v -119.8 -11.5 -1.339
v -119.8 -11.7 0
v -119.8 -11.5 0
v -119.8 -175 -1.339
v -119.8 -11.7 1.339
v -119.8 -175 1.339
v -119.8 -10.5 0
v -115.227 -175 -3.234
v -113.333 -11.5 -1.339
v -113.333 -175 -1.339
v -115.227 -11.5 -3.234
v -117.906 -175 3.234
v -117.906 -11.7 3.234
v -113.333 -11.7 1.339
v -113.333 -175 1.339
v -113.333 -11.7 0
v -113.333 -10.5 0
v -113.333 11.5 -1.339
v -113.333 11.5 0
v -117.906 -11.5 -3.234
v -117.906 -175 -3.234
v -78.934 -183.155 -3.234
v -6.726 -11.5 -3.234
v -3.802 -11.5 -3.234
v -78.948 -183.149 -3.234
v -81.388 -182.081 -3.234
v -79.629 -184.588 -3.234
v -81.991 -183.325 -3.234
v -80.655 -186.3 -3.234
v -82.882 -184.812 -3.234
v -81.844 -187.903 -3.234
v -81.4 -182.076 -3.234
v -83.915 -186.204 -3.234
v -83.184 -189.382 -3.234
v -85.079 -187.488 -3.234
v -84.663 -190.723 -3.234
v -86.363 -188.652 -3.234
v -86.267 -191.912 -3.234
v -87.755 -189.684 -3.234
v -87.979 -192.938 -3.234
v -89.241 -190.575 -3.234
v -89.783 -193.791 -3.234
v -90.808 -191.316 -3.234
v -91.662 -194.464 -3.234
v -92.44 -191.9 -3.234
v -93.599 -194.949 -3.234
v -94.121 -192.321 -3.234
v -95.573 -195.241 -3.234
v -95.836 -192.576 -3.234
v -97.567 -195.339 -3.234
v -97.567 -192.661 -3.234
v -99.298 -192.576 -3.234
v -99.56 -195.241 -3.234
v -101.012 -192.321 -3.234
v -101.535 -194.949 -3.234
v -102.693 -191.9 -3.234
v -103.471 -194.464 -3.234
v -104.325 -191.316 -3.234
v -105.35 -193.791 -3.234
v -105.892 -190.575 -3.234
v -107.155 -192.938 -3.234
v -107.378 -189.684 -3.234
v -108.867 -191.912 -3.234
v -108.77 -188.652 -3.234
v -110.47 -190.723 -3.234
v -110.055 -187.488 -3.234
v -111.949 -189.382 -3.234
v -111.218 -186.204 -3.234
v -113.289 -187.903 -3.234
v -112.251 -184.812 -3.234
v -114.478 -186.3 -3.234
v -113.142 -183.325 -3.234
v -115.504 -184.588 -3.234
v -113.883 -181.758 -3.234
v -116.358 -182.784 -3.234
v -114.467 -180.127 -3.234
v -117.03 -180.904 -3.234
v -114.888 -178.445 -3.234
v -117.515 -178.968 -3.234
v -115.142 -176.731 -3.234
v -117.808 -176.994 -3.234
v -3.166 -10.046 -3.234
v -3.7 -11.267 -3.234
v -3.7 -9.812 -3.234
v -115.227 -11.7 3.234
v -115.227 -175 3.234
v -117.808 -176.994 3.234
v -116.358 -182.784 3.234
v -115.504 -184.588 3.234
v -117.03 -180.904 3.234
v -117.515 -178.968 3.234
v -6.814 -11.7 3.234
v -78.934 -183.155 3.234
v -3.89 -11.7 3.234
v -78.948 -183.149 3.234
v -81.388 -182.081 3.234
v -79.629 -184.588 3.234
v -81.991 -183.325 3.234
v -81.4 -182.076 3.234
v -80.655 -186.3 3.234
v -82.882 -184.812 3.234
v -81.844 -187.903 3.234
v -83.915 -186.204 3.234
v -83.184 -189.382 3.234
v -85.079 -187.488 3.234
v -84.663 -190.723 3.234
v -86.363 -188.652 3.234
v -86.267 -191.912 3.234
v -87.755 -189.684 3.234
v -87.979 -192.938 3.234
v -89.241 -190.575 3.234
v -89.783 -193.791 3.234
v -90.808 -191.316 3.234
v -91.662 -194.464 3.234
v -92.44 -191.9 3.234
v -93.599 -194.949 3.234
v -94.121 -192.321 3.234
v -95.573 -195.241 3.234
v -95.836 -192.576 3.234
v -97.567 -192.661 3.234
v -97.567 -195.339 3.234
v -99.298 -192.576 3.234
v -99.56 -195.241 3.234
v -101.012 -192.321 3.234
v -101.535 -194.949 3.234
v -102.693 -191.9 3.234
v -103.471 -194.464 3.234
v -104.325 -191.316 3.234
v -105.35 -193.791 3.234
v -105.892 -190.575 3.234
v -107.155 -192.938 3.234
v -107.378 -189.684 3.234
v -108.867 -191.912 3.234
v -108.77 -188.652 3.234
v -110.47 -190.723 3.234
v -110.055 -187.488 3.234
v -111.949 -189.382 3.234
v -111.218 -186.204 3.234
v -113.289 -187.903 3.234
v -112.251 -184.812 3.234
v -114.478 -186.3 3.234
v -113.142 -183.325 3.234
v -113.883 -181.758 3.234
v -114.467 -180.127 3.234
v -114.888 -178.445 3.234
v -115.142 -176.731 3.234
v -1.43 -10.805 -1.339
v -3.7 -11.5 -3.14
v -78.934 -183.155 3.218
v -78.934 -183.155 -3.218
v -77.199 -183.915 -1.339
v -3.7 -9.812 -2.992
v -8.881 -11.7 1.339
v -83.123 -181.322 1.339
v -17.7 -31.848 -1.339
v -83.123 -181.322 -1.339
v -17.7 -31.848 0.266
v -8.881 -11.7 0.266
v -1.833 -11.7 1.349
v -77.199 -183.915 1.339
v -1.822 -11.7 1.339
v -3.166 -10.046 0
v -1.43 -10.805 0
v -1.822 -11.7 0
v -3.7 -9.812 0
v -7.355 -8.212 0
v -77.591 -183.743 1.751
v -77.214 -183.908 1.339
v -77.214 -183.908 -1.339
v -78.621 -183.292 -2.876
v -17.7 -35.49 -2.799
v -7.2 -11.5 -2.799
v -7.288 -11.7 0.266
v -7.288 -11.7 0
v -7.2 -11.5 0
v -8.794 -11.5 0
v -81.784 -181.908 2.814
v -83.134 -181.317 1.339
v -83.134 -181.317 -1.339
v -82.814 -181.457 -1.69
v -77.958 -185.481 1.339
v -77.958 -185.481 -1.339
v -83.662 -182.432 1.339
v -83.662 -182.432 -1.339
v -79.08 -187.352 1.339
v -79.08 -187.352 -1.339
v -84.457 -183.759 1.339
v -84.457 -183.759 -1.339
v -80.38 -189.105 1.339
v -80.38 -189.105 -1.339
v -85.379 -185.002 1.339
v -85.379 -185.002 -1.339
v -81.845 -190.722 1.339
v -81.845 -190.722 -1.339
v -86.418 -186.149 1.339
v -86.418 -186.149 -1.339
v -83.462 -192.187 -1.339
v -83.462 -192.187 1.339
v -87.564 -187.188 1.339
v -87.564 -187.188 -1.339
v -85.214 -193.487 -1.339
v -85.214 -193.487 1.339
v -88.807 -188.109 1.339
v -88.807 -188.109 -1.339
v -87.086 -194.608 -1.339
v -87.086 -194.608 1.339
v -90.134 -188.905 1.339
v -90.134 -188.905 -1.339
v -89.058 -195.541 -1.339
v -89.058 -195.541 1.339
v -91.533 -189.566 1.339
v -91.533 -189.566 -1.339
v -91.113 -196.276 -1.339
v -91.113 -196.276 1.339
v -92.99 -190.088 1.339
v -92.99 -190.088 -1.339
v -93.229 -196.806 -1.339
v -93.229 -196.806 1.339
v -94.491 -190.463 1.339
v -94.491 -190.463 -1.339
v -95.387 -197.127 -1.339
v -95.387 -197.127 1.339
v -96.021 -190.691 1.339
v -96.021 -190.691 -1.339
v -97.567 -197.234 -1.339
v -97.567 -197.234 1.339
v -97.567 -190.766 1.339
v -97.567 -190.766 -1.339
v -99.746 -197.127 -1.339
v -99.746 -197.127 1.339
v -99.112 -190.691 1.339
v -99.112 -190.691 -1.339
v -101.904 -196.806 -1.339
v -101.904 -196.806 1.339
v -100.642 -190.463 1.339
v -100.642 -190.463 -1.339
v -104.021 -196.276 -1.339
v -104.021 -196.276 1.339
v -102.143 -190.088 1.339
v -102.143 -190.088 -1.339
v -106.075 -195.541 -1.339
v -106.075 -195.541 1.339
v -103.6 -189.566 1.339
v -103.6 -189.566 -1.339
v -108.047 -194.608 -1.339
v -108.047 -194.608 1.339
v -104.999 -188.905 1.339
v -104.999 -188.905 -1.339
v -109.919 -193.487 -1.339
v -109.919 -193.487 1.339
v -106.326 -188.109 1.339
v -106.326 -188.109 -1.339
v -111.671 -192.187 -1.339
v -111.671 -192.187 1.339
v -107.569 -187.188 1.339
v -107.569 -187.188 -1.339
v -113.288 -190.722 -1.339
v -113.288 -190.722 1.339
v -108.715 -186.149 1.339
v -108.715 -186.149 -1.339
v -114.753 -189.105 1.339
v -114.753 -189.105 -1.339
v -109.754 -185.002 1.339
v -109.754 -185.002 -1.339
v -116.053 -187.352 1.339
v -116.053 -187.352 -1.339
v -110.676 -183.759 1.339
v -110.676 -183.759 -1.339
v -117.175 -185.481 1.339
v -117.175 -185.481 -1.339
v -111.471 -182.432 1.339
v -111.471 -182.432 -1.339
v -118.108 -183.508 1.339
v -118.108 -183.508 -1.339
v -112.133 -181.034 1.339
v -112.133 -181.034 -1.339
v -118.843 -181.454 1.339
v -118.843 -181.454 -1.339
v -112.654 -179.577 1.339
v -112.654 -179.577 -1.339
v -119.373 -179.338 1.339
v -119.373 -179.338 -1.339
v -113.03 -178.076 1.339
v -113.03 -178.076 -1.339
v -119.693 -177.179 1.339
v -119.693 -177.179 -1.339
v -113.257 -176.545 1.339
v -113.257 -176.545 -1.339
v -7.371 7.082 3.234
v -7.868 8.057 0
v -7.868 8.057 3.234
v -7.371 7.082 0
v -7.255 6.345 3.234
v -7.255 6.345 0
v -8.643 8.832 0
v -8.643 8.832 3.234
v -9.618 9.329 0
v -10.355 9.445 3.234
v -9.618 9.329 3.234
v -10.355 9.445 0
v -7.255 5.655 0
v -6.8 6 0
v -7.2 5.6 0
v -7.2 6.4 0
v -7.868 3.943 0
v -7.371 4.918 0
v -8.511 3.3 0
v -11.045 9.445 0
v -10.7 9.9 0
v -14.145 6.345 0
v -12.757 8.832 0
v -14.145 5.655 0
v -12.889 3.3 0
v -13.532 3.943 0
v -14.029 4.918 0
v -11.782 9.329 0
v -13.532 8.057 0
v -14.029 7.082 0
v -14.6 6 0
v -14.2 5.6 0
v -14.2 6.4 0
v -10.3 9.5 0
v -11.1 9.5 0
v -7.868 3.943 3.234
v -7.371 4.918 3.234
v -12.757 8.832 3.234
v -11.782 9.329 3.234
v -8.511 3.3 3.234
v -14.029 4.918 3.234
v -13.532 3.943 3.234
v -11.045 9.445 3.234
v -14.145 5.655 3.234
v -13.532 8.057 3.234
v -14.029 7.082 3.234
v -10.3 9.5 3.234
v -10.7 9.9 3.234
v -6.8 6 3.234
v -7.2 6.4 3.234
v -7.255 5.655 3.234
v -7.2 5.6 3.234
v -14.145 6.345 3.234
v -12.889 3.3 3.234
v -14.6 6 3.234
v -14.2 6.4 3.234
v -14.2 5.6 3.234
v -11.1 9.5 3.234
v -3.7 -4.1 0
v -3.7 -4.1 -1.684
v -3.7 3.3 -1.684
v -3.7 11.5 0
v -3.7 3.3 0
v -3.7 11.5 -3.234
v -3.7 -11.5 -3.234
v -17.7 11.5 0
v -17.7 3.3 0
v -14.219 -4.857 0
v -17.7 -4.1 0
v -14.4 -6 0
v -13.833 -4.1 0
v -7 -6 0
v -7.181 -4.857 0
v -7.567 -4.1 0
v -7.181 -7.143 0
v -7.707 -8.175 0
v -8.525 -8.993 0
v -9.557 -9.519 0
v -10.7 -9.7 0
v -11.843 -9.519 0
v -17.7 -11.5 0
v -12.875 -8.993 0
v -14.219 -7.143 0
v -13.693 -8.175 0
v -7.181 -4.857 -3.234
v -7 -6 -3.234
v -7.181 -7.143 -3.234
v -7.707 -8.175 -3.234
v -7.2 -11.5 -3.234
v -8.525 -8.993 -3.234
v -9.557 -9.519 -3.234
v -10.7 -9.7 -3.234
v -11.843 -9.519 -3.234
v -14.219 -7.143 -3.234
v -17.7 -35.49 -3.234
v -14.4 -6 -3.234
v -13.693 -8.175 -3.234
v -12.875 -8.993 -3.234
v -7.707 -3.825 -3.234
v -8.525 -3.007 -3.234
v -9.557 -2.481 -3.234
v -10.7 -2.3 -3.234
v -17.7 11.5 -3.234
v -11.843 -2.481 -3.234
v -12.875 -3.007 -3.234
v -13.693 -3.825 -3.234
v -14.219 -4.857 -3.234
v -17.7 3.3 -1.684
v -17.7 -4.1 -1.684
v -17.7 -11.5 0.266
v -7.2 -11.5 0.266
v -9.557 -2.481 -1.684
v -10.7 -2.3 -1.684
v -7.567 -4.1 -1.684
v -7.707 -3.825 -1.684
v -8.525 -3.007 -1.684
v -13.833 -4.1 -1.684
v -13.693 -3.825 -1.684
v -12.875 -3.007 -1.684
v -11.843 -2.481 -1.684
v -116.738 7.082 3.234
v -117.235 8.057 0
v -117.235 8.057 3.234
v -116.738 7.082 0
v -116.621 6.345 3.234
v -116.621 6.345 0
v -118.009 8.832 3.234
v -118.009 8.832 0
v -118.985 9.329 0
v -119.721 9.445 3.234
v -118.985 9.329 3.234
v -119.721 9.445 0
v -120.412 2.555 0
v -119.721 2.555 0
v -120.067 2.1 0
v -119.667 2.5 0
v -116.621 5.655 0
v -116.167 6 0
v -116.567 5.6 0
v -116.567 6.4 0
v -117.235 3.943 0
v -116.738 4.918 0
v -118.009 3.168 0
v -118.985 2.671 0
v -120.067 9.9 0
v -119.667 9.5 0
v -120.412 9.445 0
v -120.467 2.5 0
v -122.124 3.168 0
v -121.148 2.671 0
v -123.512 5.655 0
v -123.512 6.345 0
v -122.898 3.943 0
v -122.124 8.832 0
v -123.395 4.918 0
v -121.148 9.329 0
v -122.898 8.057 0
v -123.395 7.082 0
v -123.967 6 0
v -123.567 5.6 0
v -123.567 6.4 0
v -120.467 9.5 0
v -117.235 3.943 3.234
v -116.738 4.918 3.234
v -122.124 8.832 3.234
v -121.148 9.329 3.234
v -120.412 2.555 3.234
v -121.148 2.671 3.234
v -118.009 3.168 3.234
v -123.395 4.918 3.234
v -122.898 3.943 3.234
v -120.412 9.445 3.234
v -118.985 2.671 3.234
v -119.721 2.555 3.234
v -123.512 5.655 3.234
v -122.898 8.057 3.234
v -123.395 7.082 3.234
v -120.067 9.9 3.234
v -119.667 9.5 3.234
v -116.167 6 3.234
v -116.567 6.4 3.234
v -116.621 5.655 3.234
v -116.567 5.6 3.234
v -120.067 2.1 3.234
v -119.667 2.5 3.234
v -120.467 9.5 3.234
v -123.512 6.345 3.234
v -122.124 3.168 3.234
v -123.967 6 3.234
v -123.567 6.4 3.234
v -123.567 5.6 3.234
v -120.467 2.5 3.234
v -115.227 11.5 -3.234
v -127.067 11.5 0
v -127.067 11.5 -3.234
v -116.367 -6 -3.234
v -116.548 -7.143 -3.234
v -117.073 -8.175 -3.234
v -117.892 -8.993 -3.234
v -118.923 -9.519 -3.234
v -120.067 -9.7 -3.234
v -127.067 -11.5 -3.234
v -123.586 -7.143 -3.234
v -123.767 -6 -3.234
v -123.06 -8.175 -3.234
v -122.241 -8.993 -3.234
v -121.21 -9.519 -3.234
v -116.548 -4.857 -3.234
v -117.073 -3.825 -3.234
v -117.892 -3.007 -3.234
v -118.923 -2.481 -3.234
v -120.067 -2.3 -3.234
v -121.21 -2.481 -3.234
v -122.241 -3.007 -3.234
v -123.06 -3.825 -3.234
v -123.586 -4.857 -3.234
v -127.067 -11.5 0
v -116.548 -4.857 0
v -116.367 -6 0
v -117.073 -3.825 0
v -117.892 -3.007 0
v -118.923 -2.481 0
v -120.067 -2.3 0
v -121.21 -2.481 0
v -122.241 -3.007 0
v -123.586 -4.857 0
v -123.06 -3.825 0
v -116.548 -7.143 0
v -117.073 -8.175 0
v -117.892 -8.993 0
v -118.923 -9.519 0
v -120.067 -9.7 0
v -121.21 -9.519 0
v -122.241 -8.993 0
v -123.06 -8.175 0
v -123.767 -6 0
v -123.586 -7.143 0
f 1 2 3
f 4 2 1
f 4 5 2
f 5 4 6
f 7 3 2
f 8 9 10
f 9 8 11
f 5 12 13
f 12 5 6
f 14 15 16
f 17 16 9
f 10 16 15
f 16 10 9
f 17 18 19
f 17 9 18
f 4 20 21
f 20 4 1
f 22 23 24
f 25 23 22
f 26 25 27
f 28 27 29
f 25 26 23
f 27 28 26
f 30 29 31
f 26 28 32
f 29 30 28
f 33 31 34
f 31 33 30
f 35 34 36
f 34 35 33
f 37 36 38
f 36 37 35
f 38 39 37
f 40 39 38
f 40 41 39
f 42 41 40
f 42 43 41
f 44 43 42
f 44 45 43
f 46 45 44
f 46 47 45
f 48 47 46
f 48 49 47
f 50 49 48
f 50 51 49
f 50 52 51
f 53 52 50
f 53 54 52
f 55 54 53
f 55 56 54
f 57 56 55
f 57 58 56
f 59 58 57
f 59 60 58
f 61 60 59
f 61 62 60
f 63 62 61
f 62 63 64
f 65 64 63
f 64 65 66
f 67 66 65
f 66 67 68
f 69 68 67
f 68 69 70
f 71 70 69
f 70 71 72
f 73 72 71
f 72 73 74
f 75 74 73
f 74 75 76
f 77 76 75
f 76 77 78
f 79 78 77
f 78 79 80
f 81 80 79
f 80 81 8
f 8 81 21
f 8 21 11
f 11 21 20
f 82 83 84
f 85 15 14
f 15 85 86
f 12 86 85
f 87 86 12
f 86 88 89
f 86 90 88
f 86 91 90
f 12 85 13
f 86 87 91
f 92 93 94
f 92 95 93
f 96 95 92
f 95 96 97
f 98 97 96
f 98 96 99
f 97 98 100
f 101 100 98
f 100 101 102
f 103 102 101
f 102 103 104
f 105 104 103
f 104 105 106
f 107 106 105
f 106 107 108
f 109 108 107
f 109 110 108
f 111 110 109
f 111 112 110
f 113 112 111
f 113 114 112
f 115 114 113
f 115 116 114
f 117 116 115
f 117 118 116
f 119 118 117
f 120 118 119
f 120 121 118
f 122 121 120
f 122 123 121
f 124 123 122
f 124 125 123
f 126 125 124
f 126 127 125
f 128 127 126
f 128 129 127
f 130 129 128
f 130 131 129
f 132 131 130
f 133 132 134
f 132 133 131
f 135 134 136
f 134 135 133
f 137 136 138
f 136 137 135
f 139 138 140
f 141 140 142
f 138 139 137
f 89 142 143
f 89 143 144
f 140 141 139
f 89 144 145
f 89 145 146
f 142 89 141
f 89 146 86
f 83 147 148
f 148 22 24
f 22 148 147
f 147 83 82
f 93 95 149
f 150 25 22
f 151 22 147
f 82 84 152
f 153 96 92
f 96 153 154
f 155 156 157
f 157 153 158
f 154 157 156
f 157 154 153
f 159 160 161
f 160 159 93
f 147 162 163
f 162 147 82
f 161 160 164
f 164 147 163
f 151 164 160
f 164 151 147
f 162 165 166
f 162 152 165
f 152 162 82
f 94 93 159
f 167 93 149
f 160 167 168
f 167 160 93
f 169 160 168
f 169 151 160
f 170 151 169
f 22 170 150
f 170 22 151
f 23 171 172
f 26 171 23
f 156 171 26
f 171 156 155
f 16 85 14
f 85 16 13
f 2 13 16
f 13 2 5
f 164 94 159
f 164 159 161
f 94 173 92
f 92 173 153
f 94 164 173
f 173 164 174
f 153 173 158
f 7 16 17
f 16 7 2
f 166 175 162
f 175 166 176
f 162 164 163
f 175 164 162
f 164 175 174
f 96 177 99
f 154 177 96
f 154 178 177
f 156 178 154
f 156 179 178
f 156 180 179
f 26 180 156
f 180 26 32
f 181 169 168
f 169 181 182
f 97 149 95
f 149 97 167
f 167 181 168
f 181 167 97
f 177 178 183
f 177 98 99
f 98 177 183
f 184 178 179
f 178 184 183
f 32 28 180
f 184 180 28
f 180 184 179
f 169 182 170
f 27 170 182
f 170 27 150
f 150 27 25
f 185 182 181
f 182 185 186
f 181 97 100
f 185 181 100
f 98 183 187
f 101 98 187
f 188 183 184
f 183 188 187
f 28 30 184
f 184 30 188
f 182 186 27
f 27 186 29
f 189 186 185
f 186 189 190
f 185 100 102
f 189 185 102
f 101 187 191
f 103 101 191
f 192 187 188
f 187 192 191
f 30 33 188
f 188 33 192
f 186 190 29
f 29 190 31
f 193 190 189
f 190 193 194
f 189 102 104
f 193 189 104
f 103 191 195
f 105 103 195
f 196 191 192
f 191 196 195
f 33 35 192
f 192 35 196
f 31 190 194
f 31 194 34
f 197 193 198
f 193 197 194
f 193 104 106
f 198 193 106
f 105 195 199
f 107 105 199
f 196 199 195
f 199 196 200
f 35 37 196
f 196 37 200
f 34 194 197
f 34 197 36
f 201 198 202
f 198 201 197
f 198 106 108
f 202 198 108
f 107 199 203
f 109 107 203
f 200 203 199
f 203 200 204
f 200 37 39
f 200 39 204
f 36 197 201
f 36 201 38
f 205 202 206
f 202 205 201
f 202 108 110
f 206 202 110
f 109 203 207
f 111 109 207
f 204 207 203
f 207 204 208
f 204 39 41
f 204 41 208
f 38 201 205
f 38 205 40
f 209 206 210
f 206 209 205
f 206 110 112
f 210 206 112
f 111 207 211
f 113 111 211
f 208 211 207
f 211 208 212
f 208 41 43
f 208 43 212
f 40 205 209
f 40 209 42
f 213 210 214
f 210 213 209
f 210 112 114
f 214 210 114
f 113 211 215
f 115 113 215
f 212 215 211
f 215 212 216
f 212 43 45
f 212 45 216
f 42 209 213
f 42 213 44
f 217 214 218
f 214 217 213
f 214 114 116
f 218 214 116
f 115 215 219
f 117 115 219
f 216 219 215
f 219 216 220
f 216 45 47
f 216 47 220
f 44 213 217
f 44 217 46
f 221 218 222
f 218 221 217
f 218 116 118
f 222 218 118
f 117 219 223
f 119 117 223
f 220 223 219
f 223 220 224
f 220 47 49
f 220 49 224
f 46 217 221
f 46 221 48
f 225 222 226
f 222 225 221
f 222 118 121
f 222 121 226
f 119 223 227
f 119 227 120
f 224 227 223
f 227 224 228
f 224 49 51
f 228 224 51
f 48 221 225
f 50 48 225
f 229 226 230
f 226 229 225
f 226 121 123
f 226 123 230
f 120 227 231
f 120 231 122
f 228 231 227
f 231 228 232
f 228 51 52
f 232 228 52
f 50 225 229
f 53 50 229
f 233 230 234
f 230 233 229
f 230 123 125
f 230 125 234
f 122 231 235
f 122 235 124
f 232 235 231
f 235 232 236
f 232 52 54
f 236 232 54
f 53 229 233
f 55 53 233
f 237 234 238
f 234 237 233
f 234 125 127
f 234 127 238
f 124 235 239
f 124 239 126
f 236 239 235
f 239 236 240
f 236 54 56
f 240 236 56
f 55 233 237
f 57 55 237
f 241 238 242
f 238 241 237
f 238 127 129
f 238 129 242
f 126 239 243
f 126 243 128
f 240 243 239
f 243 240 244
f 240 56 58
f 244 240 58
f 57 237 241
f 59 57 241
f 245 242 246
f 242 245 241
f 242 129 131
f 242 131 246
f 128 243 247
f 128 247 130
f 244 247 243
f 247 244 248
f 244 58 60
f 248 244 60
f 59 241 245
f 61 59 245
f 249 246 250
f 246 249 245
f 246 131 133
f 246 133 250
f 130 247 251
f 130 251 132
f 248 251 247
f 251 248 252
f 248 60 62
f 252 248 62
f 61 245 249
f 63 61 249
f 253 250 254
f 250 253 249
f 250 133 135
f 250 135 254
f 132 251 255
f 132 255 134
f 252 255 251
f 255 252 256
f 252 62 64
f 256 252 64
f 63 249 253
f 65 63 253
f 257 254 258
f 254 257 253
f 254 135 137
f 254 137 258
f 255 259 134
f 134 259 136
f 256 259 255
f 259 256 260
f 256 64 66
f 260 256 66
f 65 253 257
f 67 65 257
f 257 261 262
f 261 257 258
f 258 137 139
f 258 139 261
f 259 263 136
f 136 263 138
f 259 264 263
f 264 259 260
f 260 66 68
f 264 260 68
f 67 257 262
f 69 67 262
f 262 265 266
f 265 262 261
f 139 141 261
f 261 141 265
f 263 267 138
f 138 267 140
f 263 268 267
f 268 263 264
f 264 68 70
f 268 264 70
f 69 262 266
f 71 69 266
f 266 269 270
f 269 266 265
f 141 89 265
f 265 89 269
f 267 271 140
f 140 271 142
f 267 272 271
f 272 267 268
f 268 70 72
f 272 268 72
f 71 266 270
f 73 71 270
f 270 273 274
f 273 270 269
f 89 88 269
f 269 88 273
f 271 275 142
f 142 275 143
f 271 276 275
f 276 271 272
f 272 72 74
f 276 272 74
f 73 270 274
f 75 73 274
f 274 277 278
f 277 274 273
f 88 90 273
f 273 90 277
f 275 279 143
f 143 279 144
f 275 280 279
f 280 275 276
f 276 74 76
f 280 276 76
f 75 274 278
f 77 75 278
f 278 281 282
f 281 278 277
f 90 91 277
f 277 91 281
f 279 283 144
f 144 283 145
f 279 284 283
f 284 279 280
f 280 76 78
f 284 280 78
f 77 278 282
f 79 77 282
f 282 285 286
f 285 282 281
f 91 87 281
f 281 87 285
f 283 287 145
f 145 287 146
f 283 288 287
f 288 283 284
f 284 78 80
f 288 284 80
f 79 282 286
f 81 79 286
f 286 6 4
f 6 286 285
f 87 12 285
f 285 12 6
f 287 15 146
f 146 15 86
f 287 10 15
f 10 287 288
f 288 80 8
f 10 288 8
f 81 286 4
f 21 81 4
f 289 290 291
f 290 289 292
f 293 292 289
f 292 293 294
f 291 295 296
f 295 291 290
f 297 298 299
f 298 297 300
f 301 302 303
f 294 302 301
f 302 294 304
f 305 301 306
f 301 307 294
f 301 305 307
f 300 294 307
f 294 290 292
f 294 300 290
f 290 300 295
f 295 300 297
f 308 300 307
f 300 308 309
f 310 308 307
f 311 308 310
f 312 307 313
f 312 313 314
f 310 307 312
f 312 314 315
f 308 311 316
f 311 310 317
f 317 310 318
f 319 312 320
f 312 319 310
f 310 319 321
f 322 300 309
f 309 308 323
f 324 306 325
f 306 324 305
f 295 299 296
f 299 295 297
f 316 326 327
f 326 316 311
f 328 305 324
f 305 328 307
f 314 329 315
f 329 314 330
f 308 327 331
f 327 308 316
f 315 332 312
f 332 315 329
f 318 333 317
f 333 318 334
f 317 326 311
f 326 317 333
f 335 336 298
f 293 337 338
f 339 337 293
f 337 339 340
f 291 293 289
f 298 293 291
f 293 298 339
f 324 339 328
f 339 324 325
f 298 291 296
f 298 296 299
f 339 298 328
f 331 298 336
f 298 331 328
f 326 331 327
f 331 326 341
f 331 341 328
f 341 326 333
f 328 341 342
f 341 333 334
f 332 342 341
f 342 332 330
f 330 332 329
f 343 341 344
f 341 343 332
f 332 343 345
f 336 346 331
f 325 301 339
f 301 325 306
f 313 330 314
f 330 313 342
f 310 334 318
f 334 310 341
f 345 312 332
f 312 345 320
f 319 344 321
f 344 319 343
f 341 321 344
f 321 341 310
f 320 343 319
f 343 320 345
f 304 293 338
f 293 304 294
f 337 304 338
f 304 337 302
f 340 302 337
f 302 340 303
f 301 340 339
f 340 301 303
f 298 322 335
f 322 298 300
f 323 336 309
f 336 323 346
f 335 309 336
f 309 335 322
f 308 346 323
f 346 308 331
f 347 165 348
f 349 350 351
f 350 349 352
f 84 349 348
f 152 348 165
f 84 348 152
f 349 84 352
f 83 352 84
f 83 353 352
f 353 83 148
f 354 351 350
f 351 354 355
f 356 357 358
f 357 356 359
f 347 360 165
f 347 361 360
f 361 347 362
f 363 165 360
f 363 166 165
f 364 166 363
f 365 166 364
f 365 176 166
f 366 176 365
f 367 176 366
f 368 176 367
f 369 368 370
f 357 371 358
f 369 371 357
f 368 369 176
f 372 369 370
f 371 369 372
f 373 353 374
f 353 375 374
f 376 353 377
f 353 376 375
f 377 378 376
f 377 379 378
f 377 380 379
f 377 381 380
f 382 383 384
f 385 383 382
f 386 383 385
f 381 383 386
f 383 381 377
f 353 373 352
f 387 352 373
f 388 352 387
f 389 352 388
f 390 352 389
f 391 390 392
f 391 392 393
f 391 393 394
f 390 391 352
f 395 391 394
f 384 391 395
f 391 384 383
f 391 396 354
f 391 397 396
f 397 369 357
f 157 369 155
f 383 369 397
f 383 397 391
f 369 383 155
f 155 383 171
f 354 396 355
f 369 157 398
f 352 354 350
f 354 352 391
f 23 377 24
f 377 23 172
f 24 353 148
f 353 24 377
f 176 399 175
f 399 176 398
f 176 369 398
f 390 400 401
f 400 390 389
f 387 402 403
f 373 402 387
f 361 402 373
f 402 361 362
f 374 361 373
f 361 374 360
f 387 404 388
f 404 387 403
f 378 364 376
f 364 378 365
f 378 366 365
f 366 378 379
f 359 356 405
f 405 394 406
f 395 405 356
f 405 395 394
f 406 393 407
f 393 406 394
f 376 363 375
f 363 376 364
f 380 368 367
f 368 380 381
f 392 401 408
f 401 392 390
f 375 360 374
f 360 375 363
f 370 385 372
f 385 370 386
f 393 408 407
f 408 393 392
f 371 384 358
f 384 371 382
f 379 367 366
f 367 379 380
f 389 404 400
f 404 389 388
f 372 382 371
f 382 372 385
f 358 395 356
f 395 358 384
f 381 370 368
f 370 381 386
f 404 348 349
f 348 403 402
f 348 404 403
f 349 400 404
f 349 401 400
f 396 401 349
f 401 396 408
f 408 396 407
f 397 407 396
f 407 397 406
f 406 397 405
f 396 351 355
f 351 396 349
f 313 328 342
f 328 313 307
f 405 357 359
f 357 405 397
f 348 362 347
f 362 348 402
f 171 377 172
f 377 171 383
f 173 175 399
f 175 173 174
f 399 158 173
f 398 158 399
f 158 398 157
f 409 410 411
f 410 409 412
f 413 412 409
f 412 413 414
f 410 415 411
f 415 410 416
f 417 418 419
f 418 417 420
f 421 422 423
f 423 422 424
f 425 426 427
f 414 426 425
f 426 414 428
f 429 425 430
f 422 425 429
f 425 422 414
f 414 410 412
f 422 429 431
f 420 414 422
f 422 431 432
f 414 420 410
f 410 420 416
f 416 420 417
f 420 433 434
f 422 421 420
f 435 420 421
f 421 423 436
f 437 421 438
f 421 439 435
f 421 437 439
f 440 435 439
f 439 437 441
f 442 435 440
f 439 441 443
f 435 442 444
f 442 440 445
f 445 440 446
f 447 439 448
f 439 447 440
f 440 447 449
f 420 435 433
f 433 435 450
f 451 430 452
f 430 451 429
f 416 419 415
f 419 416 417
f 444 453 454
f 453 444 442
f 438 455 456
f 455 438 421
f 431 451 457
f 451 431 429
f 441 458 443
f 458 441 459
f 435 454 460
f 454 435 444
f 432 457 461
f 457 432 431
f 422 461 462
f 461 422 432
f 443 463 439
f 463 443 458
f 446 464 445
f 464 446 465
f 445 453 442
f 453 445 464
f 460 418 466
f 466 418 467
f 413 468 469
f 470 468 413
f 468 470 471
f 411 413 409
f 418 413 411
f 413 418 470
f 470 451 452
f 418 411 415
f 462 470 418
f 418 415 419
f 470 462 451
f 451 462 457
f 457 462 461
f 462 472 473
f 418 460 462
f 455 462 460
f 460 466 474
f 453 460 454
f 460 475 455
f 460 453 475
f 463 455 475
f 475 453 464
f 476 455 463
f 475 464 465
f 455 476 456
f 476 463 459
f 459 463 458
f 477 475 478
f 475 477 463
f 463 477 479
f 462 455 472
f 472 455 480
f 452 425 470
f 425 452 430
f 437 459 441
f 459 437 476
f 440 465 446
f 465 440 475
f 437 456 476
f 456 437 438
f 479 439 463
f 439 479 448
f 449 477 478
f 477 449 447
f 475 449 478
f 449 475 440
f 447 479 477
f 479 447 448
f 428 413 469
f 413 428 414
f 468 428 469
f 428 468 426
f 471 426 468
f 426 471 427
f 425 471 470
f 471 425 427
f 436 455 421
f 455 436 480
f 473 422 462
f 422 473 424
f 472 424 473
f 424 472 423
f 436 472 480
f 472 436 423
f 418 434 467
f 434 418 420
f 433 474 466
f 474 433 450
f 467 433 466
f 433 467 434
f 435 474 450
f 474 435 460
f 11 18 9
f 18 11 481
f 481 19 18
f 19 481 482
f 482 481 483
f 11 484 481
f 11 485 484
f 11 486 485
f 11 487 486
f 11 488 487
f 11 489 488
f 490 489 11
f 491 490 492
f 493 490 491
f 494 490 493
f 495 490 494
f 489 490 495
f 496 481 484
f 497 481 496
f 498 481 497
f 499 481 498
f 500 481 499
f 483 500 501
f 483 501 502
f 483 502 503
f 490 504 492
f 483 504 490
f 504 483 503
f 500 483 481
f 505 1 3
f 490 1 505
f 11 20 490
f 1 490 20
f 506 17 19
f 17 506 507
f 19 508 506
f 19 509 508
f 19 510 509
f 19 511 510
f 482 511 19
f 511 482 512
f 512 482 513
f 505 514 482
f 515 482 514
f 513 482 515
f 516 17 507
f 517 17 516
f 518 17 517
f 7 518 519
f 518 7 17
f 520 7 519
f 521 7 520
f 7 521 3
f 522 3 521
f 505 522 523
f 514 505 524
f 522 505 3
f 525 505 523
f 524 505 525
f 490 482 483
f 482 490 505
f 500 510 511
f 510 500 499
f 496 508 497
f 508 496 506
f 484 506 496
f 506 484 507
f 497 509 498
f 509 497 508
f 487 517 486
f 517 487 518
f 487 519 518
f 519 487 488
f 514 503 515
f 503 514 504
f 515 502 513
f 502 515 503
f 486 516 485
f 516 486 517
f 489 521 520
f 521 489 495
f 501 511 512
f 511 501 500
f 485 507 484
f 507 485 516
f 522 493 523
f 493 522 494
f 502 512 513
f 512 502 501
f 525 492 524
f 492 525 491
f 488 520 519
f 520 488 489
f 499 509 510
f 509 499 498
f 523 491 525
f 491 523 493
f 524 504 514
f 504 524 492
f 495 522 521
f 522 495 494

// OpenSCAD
/*
* @license CC-BY
*
Version 2.1
-------------
Added customizable bar roundness
Made Thingiverse Customizer compatible
Added tolerance parameter for clearances
Made vertical crossbeam in hanger stonger
Added control of number of facets in beam
Added parameter to control hook height

TODO
-----
TEST: Clearance around bottom pin plate

*/
part = "side"; // ["side", "hook", "all"]
// end-to-end length
length = 390; 
// approximate height to top of diagonal, from center of bar to center of bar
height = 110; 
// bar diameter
bar_d = 7;
// corner bend diameter
bend_d = 38;
// space between pins on pin plate
pin_buffer = 5;
// hook centerline diameter. Equals inner diameter plus bar_d
hook_d = 57;
// top of diagonal to top of hook
hook_h = 110;
// roundness. 8 is good for printing with no supports. 12 might work, too.
bar_facets = 8; // [8,12,16,20,24,32,64]
// space between mating parts
tolerance = 0.2; 

/* [Hidden] */
// bar radius
bar_r = bar_d / 2;
// bend radius
bend_r = bend_d / 2;
// compensate for truncation of radius due to low poly count
thickness = bar_d*cos(180/(bar_facets)); 
// pin diameter
pin_d = bar_d;
// left-to-right plate height
plate_h = pin_d * 2 + pin_buffer + 4;
// top to bottom plate width
plate_w = pin_d * 2;
// thickness of bottom plate
plate_t = thickness / 2;
// left-to-right crossbeam height
crossbeam_h = pin_d;
// length of horizontal bar
bottom_l = length /2 - bend_r - plate_h / 2;
// corner angle
//corner_a = atan((height - bend_d)/ bottom_l);
corner_a = atan((height - bend_d)/ bottom_l);
// length of diagonal bar
top_l = sqrt((bottom_l + tan(corner_a)*bend_r) * (bottom_l + tan(corner_a)*bend_r) + (height - bend_d)*(height - bend_d));

bend_a = 180 - corner_a;
// hook radius
hook_r = hook_d / 2;
// distance to move the horizontal bar
bottom_offset = -sin(corner_a)*top_l - bend_d - bar_r;

module ring(outer, inner) {
	rotate_extrude($fn=64) translate([inner, 0, 0]) rotate([0, 0, -22.5]) circle(r = outer, $fn = bar_facets);
}

module partial_ring(outer, inner, deg) {
  compliment = 360 - deg;
	
	difference() {
		ring(outer, inner);

		if (compliment < 90) {
			translate([0, 0, -outer])
				linear_extrude(height = outer * 2)
					polygon(points = [[0,0],
														[-(inner + outer), 0], 
														[-(inner + outer),(inner + outer) * tan(compliment)]]);
		}
		else if (compliment < 180) {
			translate([-(inner + outer), 0, -outer])
				cube(size = [inner + outer, inner + outer, outer*2], center = false);

			translate([0, 0, -outer])
			linear_extrude(height = outer * 2)
				polygon(points = [[0,0],
													[0, (inner + outer)], 
													[(inner + outer) * tan(compliment - 90),
			(inner + outer),]]);
		}
		else if (compliment < 270) {
			translate([-(inner + outer), 0, -outer])
				cube(size = [(inner + outer)*2, inner + outer, outer*2], center = false);

			translate([0, 0, -outer])
			linear_extrude(height = outer * 2)
				polygon(points = [[0,0],
													[(inner + outer), 0], 
													[(inner + outer),
			-(inner + outer) * tan(compliment - 180)]]);

		}
		else {
			translate([-(inner + outer), 0, -outer])
				cube(size = [(inner + outer)*2, inner + outer, outer*2], center = false);

translate([0, -(inner + outer), -outer])
	cube(size = [inner + outer, inner + outer, outer*2], center = false);
	
			translate([0, 0, -outer])
			linear_extrude(height = outer * 2)
				polygon(points = [[0,0],
													[0, -(inner + outer)], 
													[(inner + outer) * tan(90 - (compliment - 180)),
														-(inner + outer)]]);
		}
  }
}

module pin(height, rad) {
	spline_sides = 4;
	module __spline() cylinder(h = height, r = tolerance*2, center = false, $fn = spline_sides);

  union() {
    cylinder(h = height, r = rad, center = false, $fn = 20);
    translate([-rad, 0, 0]) __spline();
    translate([rad, 0, 0]) __spline();
    translate([0, -rad, 0]) __spline();
    translate([0, rad, 0]) __spline();
  }
}

module pinplate(plate_t, num_pins, pin_d, bar=false) {
  plate_w = pin_d * (num_pins * 2);
	pin_r = pin_d / 2;
	
	module __plate(bar) {
		if (bar) {
			intersection() {
				// rounded top of plate
				translate([plate_w - bar_r, 0, plate_t]) rotate([-90, 0, 0]) bar(plate_h);
				cube([plate_w, plate_h, plate_t], center=false);
			}
			// bottom of plate
			cube(size = [plate_w*3/4, plate_h, plate_t], center=false);
		} else {
			// bottom of plate
			cube(size = [plate_w, plate_h, plate_t], center=false);
		}
	}
	
	difference() {
		union() {
			__plate(bar);
			// pins 
			for (i = [0:num_pins - 1]) {
				translate([pin_d + pin_d * i * 2, pin_d + pin_r + pin_buffer + 2, plate_t])
					pin(plate_t, pin_r);
			}
		}    

		// pin holes
		for (i = [0:num_pins - 1]) {
			translate([pin_d + pin_d * i * 2, pin_r + 2, -1])
        cylinder(h = plate_t + 2, r = pin_r + tolerance, center = false, $fn = 20);

/*	rotate(a = [0, 180, 0])
          pinhole(h = plate_t, r = pin_r, lh = plate_t / 3, lt = 1,
	          t = 0.3, tight = true);*/
		}
	}  
}  

module bar(h, flip=false) {
	angle = 180/bar_facets;
	rotation = flip ? angle : -angle;
	rotate([0, 0, rotation]) cylinder(h=h, r = bar_r, $fn = bar_facets);
}

module hangerside() {
	clearance_h = plate_h + tolerance*2;
	
  rotate(a = [270, 0, 0]) {

		difference() {
			union() {
				// horizontal bar
				bar(h=bottom_l);
				// diagonal bar
				translate([bend_r, 0, 0])
					rotate(a = [0, corner_a, 0])
					translate([bend_r, 0, 0])  
						bar(h=top_l + bar_r/2, flip=true);
			}
			
			// trim end of bar
			translate([-height/2, -bar_r, bottom_l - 1 - tolerance])
				cube([height*2, bar_r, clearance_h]);
			translate([height + bar_r, -bar_r, bottom_l - 1 - tolerance])
				cube([plate_w, bar_r, clearance_h]);
		}

		// outside bend
		translate([bend_r, 0, 0])
			rotate([90, 0, 0]) partial_ring(bar_r, bend_r, bend_a);
	}

	// top pin plate
//  translate([height - bar_r * 3, bottom_l - 1, -bar_r + .5])  {
  translate([-bottom_offset - plate_w - bar_r - tolerance, bottom_l - 1, -plate_t])  {
    difference() {
      pinplate(plate_t, 1, pin_d);
			// cut-out for hook "I"
      translate([-1, plate_w/2 + tolerance*2, bar_r / 2 - tolerance])
        cube(size = [plate_w + 2, crossbeam_h + tolerance * 2, bar_d], center=false);
		}
		// gussett next to pin plate
		linear_extrude(height = bar_r)
			 polygon(points = [[0,0], [bar_r * 3, 0], [0, (1/tan(corner_a))* -(bar_r * 3)]]);
  }

  // bottom pin plate
	translate([-plate_w + bar_r, bottom_l-1, -plate_t])
    pinplate(plate_t, 1, pin_d, bar=true);
}

module hangerhook() {
	straight_h = max(hook_h - bar_d - hook_d, 0);
	top_offset = hook_h - hook_r - bar_d;
  rotate(a = [-90, 0, -90]) 
	{
		// build the hook in the z direction
		// top half of hook
		translate([0, 0, top_offset])
      rotate(a = [-90, 0, 0])
      partial_ring(bar_r, hook_r, 180);
		// rounded end of top half
		translate([-hook_r, 0, top_offset]) rotate([0, 0, 180/bar_facets]) sphere(d = bar_d, $fn = bar_facets);
    translate([hook_r, 0, hook_r]) bar(h=straight_h);
    translate([0, 0, hook_r]) rotate(a = [90, 0, 180])
      partial_ring(bar_r, hook_r, 90);
    // smooth entry into the bracket
		translate([0, 0, 0]) scale([3, 1, 1]) rotate([0, 0, 180/bar_facets]) sphere(d = bar_d, $fn = bar_facets);
		translate([0, 0, -bar_r / 2])
			cube(size = [plate_h, thickness, bar_r], center = true);
		// middle of "I"
		translate([0, 0, -plate_w / 2 - tolerance - bar_r])
			cube(size = [crossbeam_h, bar_r, plate_w + tolerance * 2], center = true);
		// bottom of "I"
		translate([0, 0, -(plate_w + bar_r * 3 / 2 + tolerance * 2)])
			cube(size = [plate_h, thickness, bar_r], center = true);
	}
}

/**** Uncomment one of either the hanger side or hook ****/


//Uncomment to render a guide outline for mendel bed
/*difference() {
  cube(size = [200, 200, 1], center=true);
  cube(size = [198, 198, 3], center=true);
}*/

if (part == "hook") {
	hangerhook();
} else if (part == "side") {
	translate([bottom_offset, - bottom_l - (plate_h)/2 + 1, 0])
		hangerside();
} else if (part == "all") {
	%hangerhook();
	translate([-sin(corner_a)*top_l - bend_d - bar_r, - bottom_l - (plate_h)/2 + 1, 0])
		hangerside();
	color("green", 0.2) rotate([180, 0, 0]) translate([-sin(corner_a)*top_l - bend_d - bar_r, - bottom_l - (plate_h)/2 + 1, 0])
		hangerside();
} else {
	echo(str("Warning! Unexpected part \"", part, "\""));
}
